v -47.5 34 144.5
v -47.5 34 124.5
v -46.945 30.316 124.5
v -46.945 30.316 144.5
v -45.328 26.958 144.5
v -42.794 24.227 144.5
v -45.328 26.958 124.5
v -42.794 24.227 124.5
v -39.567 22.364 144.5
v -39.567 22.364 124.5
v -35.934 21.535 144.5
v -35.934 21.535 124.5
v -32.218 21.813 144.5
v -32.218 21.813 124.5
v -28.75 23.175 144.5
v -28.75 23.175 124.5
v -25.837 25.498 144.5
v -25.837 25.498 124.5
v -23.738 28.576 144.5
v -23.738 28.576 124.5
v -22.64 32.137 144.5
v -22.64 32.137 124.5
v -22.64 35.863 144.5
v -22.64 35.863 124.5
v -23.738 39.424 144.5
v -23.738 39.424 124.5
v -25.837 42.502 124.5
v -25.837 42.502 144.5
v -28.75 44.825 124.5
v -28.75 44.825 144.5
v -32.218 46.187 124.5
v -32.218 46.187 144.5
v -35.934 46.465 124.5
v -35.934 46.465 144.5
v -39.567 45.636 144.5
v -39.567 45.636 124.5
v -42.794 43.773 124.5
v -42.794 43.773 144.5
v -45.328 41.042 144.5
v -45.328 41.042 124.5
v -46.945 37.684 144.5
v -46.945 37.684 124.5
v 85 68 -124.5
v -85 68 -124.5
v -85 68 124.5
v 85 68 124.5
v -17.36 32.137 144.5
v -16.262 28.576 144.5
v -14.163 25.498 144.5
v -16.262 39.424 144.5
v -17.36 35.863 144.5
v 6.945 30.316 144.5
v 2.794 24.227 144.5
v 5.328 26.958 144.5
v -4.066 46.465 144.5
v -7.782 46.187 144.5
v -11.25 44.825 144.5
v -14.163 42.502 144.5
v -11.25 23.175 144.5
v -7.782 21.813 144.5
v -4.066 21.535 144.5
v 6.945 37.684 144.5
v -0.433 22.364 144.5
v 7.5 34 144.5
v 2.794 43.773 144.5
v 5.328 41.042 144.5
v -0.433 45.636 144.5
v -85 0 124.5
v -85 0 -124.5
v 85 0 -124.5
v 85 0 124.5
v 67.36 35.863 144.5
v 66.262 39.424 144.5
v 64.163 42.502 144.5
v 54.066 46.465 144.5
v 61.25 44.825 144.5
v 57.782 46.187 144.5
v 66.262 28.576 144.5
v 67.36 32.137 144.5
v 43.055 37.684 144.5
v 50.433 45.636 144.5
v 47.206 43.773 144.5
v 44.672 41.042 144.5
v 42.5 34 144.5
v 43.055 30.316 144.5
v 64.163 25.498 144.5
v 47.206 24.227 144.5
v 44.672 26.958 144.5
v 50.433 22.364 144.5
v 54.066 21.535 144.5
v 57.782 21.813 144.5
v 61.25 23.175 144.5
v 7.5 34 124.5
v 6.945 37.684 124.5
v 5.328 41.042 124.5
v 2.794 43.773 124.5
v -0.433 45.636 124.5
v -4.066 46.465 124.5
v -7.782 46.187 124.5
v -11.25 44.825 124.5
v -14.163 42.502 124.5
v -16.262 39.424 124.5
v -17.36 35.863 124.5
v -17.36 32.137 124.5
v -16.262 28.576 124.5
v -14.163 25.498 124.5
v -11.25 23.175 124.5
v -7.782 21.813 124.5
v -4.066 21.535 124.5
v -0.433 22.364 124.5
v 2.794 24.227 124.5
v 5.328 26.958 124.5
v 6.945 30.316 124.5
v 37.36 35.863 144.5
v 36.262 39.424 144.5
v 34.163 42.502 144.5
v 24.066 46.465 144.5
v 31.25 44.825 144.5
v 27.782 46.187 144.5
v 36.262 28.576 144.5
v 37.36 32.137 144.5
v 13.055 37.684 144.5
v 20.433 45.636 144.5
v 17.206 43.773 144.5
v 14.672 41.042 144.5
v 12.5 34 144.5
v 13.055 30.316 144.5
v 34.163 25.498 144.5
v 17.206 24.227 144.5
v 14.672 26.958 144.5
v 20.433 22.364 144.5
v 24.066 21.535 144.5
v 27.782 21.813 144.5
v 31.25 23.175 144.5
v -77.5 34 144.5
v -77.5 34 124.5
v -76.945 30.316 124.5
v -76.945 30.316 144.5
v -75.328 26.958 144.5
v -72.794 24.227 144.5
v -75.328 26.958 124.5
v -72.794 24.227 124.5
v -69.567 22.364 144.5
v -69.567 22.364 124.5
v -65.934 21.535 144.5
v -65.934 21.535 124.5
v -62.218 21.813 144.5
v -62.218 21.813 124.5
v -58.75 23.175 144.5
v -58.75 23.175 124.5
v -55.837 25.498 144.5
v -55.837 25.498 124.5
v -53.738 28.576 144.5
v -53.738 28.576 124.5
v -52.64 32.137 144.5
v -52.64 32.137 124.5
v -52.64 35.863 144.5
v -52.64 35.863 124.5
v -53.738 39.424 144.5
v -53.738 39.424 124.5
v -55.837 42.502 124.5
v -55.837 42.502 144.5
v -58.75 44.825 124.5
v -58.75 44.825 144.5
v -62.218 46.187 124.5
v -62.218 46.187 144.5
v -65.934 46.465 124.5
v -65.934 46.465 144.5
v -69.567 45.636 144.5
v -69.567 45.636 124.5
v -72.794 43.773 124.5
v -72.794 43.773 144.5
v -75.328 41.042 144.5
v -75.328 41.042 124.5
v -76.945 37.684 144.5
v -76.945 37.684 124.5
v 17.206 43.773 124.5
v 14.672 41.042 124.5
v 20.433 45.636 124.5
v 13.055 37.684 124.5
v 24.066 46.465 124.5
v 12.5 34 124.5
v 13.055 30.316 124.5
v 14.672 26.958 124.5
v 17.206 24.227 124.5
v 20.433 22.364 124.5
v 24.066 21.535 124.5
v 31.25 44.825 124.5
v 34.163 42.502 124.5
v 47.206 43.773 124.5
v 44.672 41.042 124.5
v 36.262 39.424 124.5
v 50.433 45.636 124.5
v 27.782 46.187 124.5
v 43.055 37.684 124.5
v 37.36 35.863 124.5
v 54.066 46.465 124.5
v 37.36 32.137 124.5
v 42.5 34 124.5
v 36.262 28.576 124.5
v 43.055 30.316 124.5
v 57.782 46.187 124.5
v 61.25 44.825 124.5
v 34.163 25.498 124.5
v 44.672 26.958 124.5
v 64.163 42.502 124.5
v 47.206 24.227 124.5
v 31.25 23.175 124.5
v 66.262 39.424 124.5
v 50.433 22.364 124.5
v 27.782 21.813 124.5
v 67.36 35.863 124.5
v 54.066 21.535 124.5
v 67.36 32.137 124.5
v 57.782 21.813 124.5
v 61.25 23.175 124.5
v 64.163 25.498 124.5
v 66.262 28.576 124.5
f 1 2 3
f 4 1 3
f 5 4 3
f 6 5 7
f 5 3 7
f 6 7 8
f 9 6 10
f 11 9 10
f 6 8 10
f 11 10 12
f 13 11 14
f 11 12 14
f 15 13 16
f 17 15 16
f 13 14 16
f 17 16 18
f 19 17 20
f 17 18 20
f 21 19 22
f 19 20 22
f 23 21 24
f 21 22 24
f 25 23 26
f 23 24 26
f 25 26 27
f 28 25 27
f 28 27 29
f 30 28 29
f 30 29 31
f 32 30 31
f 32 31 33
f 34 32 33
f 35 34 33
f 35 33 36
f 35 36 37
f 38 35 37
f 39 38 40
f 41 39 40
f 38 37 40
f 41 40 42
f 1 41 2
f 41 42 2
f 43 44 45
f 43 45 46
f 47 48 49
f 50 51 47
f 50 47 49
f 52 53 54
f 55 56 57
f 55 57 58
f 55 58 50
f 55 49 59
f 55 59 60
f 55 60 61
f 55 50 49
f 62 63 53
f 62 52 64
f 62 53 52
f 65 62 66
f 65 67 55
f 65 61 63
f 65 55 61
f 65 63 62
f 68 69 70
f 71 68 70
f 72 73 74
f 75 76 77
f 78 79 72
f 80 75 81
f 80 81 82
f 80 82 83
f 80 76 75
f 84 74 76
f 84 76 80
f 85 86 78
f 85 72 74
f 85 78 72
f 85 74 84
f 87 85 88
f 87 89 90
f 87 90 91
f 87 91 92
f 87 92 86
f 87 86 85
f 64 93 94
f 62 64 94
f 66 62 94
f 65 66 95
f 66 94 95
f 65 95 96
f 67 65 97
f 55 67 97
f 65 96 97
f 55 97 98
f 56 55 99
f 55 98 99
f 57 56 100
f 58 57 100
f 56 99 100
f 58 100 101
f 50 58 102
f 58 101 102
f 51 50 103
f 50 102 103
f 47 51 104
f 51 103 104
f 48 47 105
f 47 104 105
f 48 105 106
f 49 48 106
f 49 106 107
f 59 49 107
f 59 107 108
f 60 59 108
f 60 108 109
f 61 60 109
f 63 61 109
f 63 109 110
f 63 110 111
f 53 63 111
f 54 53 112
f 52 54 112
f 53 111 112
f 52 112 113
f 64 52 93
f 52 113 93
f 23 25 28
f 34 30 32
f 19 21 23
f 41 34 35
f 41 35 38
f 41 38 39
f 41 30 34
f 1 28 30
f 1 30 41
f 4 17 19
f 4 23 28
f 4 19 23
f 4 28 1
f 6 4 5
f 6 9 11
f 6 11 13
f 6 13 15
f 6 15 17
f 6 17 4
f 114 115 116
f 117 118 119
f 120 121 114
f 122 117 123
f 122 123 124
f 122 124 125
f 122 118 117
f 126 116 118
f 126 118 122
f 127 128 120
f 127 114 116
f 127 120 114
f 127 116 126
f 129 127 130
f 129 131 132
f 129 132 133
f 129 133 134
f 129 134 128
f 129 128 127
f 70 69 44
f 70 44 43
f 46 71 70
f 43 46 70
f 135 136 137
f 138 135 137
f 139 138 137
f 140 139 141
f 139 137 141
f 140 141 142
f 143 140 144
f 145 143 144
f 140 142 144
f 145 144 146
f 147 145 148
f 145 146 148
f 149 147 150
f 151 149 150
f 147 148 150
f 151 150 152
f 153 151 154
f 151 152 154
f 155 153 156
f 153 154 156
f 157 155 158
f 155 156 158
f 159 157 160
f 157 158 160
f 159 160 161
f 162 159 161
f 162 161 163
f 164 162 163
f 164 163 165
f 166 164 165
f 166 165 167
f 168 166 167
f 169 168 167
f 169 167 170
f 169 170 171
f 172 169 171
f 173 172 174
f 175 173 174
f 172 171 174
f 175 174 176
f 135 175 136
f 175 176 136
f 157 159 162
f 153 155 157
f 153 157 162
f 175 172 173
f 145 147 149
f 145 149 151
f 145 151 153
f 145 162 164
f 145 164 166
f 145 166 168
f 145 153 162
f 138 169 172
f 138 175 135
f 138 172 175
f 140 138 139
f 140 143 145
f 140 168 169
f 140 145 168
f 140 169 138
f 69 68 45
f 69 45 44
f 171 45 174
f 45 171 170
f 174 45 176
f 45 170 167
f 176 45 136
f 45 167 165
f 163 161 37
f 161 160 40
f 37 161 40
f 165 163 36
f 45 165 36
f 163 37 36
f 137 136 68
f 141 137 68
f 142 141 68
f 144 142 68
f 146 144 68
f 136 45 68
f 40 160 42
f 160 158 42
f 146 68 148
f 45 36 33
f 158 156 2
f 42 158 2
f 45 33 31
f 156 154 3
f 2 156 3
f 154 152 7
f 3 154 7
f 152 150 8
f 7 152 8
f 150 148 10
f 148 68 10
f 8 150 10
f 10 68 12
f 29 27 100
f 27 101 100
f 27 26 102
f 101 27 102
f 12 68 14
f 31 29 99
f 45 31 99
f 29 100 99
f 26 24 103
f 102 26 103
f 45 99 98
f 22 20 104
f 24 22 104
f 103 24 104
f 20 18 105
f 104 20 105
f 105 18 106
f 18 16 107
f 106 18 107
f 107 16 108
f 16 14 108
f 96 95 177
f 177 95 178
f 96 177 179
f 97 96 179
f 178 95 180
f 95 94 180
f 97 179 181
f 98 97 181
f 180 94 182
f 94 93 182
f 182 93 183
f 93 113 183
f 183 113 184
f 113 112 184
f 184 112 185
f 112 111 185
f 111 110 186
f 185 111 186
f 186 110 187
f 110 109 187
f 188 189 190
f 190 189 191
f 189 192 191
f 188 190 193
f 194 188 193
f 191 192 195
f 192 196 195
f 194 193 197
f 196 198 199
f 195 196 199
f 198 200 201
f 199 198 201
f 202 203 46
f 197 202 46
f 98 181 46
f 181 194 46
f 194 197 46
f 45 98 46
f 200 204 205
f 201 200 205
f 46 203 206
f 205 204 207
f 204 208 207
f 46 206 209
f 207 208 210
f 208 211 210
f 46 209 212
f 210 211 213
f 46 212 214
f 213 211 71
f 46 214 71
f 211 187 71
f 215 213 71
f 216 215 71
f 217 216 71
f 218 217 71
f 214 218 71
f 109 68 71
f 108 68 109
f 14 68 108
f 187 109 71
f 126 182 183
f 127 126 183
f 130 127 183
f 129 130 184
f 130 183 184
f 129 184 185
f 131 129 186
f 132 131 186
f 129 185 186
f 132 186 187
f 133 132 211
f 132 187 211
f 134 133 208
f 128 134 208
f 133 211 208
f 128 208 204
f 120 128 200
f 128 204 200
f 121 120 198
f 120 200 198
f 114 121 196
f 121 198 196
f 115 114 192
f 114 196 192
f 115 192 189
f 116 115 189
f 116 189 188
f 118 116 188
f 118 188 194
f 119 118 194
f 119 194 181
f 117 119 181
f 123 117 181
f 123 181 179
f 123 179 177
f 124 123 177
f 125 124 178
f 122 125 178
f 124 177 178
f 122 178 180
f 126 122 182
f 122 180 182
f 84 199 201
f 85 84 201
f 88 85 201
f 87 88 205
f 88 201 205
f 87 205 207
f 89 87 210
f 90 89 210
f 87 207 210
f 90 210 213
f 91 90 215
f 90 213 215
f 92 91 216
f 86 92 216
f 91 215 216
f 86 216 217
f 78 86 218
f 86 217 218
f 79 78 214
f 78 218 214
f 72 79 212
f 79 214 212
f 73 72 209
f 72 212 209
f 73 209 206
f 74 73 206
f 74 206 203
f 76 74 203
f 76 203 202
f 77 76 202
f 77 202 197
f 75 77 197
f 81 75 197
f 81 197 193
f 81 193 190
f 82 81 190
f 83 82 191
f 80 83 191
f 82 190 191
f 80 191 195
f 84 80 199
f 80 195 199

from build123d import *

# Parameters (mm, degrees)
SKETCH1_W           = 170
SKETCH1_H           = 249
BOSS_EXTRUDE1_DEPTH = 68
SKETCH2_R           = 12.5
BOSS_EXTRUDE2_DEPTH = 20


with BuildPart() as part:
    # Sketch1 → Boss-Extrude1 (new body)
    with BuildSketch(Plane(origin=(0, 0, 0), x_dir=(1, 0, 0), z_dir=(0, 1, 0))):
        Rectangle(SKETCH1_W, SKETCH1_H)
    extrude(amount=BOSS_EXTRUDE1_DEPTH)

    # Sketch2 → Boss-Extrude2 (add)
    with BuildSketch(Plane.XY.offset(124.5)):
        with Locations(Location((-65, 34, 0), (0, 0, 180))):
            Circle(SKETCH2_R)
        with Locations(Location((-35, 34, 0), (0, 0, 180))):
            Circle(SKETCH2_R)
        with Locations((-5, 34)):
            Circle(SKETCH2_R)
        with Locations(Location((25, 34, 0), (0, 0, 180))):
            Circle(SKETCH2_R)
        with Locations(Location((55, 34, 0), (0, 0, 180))):
            Circle(SKETCH2_R)
    extrude(amount=BOSS_EXTRUDE2_DEPTH)


solid = part.part
